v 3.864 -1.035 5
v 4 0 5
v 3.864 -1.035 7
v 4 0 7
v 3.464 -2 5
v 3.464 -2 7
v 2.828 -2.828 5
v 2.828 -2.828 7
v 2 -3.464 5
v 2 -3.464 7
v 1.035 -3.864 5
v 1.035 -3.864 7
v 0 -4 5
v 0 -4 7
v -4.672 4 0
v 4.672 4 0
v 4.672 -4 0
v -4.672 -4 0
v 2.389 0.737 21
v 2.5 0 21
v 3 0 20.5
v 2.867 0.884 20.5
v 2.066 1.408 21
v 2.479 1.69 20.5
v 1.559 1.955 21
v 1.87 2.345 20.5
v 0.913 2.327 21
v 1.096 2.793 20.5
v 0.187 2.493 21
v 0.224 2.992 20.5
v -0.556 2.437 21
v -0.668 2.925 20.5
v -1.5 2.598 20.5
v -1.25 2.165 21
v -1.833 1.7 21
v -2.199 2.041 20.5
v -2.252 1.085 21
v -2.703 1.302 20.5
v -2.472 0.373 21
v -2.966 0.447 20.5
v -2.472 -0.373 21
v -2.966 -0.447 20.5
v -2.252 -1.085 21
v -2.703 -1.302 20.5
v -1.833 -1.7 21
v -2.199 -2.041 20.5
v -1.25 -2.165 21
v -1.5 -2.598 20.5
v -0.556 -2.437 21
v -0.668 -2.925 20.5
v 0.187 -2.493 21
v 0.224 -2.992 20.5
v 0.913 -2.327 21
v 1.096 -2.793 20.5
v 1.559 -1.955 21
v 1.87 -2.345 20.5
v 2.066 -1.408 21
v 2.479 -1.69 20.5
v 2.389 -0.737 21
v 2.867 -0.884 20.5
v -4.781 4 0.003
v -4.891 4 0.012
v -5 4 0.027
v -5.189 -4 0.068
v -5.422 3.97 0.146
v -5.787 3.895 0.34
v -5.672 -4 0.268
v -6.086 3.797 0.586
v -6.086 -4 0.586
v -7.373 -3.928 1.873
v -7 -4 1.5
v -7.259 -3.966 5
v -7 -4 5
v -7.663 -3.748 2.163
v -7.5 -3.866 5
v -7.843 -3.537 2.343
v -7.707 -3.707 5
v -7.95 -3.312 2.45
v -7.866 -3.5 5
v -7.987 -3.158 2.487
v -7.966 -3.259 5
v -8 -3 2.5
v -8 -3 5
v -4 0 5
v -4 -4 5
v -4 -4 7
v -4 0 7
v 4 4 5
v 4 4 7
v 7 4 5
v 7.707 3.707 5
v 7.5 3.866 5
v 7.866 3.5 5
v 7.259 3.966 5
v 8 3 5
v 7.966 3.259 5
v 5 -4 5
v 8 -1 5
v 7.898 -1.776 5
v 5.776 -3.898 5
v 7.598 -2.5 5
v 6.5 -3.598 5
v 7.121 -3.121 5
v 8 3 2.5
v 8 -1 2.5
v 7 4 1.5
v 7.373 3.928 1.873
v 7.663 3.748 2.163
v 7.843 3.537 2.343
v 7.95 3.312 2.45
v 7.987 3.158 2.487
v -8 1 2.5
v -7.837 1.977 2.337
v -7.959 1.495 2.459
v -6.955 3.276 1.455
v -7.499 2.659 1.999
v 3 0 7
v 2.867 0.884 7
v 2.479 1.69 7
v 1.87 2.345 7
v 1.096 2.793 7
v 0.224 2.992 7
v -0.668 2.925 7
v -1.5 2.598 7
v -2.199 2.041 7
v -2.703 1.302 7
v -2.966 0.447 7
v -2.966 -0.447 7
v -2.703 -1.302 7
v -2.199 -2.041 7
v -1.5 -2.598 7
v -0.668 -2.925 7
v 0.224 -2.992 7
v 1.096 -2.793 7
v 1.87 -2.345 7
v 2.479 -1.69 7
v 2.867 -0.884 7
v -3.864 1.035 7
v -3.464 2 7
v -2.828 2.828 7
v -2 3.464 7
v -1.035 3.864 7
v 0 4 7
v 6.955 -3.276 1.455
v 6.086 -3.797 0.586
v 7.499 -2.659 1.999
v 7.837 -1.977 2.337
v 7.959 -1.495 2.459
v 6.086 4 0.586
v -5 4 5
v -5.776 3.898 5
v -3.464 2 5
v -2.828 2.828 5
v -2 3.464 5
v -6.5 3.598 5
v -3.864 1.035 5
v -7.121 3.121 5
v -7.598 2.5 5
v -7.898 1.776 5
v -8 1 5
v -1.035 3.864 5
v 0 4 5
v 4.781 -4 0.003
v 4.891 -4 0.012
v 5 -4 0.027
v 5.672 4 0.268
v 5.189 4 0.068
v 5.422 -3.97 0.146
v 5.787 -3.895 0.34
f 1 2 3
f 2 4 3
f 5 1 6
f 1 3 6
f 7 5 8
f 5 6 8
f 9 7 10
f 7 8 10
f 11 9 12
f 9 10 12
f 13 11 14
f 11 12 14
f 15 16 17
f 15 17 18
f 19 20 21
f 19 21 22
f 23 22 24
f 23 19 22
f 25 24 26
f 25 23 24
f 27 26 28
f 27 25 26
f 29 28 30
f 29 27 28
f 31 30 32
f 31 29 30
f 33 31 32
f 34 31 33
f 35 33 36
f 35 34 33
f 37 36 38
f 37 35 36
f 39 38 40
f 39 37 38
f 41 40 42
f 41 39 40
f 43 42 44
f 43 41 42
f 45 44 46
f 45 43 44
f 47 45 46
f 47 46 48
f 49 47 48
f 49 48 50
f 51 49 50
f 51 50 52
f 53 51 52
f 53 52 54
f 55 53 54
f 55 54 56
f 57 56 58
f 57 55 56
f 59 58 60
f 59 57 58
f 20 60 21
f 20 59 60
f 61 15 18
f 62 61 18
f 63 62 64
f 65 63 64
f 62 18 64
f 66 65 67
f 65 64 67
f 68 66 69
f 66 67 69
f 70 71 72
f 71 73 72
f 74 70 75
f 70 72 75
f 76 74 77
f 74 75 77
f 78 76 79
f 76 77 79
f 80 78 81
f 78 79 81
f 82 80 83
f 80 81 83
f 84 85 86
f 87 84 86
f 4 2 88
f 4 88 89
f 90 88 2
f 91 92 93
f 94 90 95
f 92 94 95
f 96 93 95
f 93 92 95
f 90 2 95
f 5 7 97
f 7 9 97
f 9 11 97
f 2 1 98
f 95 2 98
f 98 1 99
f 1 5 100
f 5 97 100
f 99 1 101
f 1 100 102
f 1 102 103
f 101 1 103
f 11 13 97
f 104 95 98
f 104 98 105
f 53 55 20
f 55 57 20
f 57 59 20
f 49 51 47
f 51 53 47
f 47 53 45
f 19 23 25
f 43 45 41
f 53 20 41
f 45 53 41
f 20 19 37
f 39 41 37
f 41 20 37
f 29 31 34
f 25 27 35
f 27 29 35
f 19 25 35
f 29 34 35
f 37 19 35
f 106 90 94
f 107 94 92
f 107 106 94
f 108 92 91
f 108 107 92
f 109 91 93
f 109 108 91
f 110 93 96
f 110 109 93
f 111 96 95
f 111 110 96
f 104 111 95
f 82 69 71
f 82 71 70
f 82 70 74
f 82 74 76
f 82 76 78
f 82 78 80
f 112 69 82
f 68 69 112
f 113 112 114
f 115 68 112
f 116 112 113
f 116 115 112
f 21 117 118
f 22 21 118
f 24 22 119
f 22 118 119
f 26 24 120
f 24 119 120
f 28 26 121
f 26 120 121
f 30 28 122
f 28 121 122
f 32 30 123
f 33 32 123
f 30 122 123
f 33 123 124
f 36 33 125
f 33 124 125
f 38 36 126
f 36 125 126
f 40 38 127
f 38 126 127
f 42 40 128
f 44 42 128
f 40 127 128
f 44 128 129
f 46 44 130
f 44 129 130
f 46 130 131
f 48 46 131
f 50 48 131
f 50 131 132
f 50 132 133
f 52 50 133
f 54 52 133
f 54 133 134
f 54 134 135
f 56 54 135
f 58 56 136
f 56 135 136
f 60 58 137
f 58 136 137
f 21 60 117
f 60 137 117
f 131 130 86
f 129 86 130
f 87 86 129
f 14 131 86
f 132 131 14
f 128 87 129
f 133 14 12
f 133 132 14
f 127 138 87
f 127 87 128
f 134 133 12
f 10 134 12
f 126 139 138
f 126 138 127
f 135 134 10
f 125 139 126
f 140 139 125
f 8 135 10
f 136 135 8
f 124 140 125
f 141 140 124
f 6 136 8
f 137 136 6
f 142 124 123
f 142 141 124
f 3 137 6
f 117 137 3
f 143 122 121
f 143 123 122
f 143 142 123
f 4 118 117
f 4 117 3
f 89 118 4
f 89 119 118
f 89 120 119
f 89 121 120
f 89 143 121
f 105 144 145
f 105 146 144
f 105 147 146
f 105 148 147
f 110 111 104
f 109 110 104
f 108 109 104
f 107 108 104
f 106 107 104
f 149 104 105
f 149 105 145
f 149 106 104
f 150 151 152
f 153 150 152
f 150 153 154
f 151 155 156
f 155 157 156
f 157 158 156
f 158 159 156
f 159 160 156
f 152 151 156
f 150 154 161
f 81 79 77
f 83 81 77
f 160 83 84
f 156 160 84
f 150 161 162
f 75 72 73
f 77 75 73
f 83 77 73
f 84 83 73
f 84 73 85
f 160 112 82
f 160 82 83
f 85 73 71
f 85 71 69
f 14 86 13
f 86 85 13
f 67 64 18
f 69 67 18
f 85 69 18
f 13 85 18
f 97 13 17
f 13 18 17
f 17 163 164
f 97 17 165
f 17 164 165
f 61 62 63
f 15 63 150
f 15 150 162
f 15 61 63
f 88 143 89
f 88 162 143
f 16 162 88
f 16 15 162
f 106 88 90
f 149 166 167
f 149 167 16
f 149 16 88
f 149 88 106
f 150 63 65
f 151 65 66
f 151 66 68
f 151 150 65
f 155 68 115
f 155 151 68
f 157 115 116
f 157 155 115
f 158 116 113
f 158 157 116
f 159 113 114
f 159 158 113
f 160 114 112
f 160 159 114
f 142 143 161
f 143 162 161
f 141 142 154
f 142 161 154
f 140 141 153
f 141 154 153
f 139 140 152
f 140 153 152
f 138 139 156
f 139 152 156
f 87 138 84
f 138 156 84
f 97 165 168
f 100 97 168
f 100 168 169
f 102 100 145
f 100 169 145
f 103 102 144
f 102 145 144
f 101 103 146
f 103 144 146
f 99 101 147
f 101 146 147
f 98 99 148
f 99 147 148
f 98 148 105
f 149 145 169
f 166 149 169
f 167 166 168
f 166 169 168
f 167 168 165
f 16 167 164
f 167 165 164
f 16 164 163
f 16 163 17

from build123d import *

# Parameters (mm, degrees)
EXTRUDE_1_DEPTH     = 8
SKETCH_2_W          = 4
SKETCH_2_H          = 2
CUT_EXTRUDE_1_DEPTH = 14.304134696
SKETCH_3_W          = 4
SKETCH_3_H          = 2
CUT_EXTRUDE_2_DEPTH = 14.304134696
SKETCH_4_W          = 3
SKETCH_4_H          = 14
CHAMFER_1_SIZE      = 0.500002905
CHAMFER_1_SIZE2     = 0.500003995
FILLET_1_R          = 1
FILLET_2_R          = 2
FILLET_3_R          = 3
FILLET_4_R          = 4


with BuildPart() as part:
    # 草图1 → 凸台-拉伸1 (new body)
    with BuildSketch(Plane(origin=(0, 4, 0), x_dir=(1, 0, 0), z_dir=(0, 1, 0))):
        Polygon((-8, -7), (8, -7), (8, -2.5), (5.5, 0), (-5.5, 0), (-8, -2.5), align=None)
    extrude(amount=-EXTRUDE_1_DEPTH)

    # 草图2 → 切除-拉伸1 (cut, through all)
    with BuildSketch(Plane.XZ.offset(4)):
        with Locations((-6, 6)):
            Rectangle(SKETCH_2_W, SKETCH_2_H)
    extrude(amount=-CUT_EXTRUDE_1_DEPTH, mode=Mode.SUBTRACT)

    # 草图3 → 切除-拉伸2 (cut, through all)
    with BuildSketch(Plane.XZ.offset(4)):
        with Locations((6, 6)):
            Rectangle(SKETCH_3_W, SKETCH_3_H)
    extrude(amount=-CUT_EXTRUDE_2_DEPTH, mode=Mode.SUBTRACT)

    # 草图4 → 旋转1 (revolve)
    with BuildSketch(Plane(origin=(0, 0, 0), x_dir=(1, 0, 0), z_dir=(0, 1, 0))):
        with Locations((1.5, -14)):
            Rectangle(SKETCH_4_W, SKETCH_4_H)
    revolve(axis=Axis((0, 0, 7), (0, 0, 1)))

    # 倒角1
    chamfer_1_edges = [part.edges().sort_by_distance(p)[0] for p in [
        (-3, 0, 21),
    ]]
    chamfer_1_side = [part.faces().sort_by_distance(p)[0] for p in [
        (-3, 0, 14),
    ]]
    chamfer(chamfer_1_edges, length=CHAMFER_1_SIZE, length2=CHAMFER_1_SIZE2, reference=chamfer_1_side[0])

    # 圆角1
    fillet_1_edges = [part.edges().sort_by_distance(p)[0] for p in [
        (8, 4, 3.75),
        (-8, -4, 3.75),
    ]]
    fillet(fillet_1_edges, radius=FILLET_1_R)

    # 圆角2
    fillet_2_edges = [part.edges().sort_by_distance(p)[0] for p in [
        (-5.5, 0, 0),
        (5.5, 0, 0),
    ]]
    fillet(fillet_2_edges, radius=FILLET_2_R)

    # 圆角3
    fillet_3_edges = [part.edges().sort_by_distance(p)[0] for p in [
        (8, -4, 3.75),
        (-8, 4, 3.75),
    ]]
    fillet(fillet_3_edges, radius=FILLET_3_R)

    # 圆角4
    fillet_4_edges = [part.edges().sort_by_distance(p)[0] for p in [
        (-4, 4, 6),
        (4, -4, 6),
    ]]
    fillet(fillet_4_edges, radius=FILLET_4_R)


solid = part.part
